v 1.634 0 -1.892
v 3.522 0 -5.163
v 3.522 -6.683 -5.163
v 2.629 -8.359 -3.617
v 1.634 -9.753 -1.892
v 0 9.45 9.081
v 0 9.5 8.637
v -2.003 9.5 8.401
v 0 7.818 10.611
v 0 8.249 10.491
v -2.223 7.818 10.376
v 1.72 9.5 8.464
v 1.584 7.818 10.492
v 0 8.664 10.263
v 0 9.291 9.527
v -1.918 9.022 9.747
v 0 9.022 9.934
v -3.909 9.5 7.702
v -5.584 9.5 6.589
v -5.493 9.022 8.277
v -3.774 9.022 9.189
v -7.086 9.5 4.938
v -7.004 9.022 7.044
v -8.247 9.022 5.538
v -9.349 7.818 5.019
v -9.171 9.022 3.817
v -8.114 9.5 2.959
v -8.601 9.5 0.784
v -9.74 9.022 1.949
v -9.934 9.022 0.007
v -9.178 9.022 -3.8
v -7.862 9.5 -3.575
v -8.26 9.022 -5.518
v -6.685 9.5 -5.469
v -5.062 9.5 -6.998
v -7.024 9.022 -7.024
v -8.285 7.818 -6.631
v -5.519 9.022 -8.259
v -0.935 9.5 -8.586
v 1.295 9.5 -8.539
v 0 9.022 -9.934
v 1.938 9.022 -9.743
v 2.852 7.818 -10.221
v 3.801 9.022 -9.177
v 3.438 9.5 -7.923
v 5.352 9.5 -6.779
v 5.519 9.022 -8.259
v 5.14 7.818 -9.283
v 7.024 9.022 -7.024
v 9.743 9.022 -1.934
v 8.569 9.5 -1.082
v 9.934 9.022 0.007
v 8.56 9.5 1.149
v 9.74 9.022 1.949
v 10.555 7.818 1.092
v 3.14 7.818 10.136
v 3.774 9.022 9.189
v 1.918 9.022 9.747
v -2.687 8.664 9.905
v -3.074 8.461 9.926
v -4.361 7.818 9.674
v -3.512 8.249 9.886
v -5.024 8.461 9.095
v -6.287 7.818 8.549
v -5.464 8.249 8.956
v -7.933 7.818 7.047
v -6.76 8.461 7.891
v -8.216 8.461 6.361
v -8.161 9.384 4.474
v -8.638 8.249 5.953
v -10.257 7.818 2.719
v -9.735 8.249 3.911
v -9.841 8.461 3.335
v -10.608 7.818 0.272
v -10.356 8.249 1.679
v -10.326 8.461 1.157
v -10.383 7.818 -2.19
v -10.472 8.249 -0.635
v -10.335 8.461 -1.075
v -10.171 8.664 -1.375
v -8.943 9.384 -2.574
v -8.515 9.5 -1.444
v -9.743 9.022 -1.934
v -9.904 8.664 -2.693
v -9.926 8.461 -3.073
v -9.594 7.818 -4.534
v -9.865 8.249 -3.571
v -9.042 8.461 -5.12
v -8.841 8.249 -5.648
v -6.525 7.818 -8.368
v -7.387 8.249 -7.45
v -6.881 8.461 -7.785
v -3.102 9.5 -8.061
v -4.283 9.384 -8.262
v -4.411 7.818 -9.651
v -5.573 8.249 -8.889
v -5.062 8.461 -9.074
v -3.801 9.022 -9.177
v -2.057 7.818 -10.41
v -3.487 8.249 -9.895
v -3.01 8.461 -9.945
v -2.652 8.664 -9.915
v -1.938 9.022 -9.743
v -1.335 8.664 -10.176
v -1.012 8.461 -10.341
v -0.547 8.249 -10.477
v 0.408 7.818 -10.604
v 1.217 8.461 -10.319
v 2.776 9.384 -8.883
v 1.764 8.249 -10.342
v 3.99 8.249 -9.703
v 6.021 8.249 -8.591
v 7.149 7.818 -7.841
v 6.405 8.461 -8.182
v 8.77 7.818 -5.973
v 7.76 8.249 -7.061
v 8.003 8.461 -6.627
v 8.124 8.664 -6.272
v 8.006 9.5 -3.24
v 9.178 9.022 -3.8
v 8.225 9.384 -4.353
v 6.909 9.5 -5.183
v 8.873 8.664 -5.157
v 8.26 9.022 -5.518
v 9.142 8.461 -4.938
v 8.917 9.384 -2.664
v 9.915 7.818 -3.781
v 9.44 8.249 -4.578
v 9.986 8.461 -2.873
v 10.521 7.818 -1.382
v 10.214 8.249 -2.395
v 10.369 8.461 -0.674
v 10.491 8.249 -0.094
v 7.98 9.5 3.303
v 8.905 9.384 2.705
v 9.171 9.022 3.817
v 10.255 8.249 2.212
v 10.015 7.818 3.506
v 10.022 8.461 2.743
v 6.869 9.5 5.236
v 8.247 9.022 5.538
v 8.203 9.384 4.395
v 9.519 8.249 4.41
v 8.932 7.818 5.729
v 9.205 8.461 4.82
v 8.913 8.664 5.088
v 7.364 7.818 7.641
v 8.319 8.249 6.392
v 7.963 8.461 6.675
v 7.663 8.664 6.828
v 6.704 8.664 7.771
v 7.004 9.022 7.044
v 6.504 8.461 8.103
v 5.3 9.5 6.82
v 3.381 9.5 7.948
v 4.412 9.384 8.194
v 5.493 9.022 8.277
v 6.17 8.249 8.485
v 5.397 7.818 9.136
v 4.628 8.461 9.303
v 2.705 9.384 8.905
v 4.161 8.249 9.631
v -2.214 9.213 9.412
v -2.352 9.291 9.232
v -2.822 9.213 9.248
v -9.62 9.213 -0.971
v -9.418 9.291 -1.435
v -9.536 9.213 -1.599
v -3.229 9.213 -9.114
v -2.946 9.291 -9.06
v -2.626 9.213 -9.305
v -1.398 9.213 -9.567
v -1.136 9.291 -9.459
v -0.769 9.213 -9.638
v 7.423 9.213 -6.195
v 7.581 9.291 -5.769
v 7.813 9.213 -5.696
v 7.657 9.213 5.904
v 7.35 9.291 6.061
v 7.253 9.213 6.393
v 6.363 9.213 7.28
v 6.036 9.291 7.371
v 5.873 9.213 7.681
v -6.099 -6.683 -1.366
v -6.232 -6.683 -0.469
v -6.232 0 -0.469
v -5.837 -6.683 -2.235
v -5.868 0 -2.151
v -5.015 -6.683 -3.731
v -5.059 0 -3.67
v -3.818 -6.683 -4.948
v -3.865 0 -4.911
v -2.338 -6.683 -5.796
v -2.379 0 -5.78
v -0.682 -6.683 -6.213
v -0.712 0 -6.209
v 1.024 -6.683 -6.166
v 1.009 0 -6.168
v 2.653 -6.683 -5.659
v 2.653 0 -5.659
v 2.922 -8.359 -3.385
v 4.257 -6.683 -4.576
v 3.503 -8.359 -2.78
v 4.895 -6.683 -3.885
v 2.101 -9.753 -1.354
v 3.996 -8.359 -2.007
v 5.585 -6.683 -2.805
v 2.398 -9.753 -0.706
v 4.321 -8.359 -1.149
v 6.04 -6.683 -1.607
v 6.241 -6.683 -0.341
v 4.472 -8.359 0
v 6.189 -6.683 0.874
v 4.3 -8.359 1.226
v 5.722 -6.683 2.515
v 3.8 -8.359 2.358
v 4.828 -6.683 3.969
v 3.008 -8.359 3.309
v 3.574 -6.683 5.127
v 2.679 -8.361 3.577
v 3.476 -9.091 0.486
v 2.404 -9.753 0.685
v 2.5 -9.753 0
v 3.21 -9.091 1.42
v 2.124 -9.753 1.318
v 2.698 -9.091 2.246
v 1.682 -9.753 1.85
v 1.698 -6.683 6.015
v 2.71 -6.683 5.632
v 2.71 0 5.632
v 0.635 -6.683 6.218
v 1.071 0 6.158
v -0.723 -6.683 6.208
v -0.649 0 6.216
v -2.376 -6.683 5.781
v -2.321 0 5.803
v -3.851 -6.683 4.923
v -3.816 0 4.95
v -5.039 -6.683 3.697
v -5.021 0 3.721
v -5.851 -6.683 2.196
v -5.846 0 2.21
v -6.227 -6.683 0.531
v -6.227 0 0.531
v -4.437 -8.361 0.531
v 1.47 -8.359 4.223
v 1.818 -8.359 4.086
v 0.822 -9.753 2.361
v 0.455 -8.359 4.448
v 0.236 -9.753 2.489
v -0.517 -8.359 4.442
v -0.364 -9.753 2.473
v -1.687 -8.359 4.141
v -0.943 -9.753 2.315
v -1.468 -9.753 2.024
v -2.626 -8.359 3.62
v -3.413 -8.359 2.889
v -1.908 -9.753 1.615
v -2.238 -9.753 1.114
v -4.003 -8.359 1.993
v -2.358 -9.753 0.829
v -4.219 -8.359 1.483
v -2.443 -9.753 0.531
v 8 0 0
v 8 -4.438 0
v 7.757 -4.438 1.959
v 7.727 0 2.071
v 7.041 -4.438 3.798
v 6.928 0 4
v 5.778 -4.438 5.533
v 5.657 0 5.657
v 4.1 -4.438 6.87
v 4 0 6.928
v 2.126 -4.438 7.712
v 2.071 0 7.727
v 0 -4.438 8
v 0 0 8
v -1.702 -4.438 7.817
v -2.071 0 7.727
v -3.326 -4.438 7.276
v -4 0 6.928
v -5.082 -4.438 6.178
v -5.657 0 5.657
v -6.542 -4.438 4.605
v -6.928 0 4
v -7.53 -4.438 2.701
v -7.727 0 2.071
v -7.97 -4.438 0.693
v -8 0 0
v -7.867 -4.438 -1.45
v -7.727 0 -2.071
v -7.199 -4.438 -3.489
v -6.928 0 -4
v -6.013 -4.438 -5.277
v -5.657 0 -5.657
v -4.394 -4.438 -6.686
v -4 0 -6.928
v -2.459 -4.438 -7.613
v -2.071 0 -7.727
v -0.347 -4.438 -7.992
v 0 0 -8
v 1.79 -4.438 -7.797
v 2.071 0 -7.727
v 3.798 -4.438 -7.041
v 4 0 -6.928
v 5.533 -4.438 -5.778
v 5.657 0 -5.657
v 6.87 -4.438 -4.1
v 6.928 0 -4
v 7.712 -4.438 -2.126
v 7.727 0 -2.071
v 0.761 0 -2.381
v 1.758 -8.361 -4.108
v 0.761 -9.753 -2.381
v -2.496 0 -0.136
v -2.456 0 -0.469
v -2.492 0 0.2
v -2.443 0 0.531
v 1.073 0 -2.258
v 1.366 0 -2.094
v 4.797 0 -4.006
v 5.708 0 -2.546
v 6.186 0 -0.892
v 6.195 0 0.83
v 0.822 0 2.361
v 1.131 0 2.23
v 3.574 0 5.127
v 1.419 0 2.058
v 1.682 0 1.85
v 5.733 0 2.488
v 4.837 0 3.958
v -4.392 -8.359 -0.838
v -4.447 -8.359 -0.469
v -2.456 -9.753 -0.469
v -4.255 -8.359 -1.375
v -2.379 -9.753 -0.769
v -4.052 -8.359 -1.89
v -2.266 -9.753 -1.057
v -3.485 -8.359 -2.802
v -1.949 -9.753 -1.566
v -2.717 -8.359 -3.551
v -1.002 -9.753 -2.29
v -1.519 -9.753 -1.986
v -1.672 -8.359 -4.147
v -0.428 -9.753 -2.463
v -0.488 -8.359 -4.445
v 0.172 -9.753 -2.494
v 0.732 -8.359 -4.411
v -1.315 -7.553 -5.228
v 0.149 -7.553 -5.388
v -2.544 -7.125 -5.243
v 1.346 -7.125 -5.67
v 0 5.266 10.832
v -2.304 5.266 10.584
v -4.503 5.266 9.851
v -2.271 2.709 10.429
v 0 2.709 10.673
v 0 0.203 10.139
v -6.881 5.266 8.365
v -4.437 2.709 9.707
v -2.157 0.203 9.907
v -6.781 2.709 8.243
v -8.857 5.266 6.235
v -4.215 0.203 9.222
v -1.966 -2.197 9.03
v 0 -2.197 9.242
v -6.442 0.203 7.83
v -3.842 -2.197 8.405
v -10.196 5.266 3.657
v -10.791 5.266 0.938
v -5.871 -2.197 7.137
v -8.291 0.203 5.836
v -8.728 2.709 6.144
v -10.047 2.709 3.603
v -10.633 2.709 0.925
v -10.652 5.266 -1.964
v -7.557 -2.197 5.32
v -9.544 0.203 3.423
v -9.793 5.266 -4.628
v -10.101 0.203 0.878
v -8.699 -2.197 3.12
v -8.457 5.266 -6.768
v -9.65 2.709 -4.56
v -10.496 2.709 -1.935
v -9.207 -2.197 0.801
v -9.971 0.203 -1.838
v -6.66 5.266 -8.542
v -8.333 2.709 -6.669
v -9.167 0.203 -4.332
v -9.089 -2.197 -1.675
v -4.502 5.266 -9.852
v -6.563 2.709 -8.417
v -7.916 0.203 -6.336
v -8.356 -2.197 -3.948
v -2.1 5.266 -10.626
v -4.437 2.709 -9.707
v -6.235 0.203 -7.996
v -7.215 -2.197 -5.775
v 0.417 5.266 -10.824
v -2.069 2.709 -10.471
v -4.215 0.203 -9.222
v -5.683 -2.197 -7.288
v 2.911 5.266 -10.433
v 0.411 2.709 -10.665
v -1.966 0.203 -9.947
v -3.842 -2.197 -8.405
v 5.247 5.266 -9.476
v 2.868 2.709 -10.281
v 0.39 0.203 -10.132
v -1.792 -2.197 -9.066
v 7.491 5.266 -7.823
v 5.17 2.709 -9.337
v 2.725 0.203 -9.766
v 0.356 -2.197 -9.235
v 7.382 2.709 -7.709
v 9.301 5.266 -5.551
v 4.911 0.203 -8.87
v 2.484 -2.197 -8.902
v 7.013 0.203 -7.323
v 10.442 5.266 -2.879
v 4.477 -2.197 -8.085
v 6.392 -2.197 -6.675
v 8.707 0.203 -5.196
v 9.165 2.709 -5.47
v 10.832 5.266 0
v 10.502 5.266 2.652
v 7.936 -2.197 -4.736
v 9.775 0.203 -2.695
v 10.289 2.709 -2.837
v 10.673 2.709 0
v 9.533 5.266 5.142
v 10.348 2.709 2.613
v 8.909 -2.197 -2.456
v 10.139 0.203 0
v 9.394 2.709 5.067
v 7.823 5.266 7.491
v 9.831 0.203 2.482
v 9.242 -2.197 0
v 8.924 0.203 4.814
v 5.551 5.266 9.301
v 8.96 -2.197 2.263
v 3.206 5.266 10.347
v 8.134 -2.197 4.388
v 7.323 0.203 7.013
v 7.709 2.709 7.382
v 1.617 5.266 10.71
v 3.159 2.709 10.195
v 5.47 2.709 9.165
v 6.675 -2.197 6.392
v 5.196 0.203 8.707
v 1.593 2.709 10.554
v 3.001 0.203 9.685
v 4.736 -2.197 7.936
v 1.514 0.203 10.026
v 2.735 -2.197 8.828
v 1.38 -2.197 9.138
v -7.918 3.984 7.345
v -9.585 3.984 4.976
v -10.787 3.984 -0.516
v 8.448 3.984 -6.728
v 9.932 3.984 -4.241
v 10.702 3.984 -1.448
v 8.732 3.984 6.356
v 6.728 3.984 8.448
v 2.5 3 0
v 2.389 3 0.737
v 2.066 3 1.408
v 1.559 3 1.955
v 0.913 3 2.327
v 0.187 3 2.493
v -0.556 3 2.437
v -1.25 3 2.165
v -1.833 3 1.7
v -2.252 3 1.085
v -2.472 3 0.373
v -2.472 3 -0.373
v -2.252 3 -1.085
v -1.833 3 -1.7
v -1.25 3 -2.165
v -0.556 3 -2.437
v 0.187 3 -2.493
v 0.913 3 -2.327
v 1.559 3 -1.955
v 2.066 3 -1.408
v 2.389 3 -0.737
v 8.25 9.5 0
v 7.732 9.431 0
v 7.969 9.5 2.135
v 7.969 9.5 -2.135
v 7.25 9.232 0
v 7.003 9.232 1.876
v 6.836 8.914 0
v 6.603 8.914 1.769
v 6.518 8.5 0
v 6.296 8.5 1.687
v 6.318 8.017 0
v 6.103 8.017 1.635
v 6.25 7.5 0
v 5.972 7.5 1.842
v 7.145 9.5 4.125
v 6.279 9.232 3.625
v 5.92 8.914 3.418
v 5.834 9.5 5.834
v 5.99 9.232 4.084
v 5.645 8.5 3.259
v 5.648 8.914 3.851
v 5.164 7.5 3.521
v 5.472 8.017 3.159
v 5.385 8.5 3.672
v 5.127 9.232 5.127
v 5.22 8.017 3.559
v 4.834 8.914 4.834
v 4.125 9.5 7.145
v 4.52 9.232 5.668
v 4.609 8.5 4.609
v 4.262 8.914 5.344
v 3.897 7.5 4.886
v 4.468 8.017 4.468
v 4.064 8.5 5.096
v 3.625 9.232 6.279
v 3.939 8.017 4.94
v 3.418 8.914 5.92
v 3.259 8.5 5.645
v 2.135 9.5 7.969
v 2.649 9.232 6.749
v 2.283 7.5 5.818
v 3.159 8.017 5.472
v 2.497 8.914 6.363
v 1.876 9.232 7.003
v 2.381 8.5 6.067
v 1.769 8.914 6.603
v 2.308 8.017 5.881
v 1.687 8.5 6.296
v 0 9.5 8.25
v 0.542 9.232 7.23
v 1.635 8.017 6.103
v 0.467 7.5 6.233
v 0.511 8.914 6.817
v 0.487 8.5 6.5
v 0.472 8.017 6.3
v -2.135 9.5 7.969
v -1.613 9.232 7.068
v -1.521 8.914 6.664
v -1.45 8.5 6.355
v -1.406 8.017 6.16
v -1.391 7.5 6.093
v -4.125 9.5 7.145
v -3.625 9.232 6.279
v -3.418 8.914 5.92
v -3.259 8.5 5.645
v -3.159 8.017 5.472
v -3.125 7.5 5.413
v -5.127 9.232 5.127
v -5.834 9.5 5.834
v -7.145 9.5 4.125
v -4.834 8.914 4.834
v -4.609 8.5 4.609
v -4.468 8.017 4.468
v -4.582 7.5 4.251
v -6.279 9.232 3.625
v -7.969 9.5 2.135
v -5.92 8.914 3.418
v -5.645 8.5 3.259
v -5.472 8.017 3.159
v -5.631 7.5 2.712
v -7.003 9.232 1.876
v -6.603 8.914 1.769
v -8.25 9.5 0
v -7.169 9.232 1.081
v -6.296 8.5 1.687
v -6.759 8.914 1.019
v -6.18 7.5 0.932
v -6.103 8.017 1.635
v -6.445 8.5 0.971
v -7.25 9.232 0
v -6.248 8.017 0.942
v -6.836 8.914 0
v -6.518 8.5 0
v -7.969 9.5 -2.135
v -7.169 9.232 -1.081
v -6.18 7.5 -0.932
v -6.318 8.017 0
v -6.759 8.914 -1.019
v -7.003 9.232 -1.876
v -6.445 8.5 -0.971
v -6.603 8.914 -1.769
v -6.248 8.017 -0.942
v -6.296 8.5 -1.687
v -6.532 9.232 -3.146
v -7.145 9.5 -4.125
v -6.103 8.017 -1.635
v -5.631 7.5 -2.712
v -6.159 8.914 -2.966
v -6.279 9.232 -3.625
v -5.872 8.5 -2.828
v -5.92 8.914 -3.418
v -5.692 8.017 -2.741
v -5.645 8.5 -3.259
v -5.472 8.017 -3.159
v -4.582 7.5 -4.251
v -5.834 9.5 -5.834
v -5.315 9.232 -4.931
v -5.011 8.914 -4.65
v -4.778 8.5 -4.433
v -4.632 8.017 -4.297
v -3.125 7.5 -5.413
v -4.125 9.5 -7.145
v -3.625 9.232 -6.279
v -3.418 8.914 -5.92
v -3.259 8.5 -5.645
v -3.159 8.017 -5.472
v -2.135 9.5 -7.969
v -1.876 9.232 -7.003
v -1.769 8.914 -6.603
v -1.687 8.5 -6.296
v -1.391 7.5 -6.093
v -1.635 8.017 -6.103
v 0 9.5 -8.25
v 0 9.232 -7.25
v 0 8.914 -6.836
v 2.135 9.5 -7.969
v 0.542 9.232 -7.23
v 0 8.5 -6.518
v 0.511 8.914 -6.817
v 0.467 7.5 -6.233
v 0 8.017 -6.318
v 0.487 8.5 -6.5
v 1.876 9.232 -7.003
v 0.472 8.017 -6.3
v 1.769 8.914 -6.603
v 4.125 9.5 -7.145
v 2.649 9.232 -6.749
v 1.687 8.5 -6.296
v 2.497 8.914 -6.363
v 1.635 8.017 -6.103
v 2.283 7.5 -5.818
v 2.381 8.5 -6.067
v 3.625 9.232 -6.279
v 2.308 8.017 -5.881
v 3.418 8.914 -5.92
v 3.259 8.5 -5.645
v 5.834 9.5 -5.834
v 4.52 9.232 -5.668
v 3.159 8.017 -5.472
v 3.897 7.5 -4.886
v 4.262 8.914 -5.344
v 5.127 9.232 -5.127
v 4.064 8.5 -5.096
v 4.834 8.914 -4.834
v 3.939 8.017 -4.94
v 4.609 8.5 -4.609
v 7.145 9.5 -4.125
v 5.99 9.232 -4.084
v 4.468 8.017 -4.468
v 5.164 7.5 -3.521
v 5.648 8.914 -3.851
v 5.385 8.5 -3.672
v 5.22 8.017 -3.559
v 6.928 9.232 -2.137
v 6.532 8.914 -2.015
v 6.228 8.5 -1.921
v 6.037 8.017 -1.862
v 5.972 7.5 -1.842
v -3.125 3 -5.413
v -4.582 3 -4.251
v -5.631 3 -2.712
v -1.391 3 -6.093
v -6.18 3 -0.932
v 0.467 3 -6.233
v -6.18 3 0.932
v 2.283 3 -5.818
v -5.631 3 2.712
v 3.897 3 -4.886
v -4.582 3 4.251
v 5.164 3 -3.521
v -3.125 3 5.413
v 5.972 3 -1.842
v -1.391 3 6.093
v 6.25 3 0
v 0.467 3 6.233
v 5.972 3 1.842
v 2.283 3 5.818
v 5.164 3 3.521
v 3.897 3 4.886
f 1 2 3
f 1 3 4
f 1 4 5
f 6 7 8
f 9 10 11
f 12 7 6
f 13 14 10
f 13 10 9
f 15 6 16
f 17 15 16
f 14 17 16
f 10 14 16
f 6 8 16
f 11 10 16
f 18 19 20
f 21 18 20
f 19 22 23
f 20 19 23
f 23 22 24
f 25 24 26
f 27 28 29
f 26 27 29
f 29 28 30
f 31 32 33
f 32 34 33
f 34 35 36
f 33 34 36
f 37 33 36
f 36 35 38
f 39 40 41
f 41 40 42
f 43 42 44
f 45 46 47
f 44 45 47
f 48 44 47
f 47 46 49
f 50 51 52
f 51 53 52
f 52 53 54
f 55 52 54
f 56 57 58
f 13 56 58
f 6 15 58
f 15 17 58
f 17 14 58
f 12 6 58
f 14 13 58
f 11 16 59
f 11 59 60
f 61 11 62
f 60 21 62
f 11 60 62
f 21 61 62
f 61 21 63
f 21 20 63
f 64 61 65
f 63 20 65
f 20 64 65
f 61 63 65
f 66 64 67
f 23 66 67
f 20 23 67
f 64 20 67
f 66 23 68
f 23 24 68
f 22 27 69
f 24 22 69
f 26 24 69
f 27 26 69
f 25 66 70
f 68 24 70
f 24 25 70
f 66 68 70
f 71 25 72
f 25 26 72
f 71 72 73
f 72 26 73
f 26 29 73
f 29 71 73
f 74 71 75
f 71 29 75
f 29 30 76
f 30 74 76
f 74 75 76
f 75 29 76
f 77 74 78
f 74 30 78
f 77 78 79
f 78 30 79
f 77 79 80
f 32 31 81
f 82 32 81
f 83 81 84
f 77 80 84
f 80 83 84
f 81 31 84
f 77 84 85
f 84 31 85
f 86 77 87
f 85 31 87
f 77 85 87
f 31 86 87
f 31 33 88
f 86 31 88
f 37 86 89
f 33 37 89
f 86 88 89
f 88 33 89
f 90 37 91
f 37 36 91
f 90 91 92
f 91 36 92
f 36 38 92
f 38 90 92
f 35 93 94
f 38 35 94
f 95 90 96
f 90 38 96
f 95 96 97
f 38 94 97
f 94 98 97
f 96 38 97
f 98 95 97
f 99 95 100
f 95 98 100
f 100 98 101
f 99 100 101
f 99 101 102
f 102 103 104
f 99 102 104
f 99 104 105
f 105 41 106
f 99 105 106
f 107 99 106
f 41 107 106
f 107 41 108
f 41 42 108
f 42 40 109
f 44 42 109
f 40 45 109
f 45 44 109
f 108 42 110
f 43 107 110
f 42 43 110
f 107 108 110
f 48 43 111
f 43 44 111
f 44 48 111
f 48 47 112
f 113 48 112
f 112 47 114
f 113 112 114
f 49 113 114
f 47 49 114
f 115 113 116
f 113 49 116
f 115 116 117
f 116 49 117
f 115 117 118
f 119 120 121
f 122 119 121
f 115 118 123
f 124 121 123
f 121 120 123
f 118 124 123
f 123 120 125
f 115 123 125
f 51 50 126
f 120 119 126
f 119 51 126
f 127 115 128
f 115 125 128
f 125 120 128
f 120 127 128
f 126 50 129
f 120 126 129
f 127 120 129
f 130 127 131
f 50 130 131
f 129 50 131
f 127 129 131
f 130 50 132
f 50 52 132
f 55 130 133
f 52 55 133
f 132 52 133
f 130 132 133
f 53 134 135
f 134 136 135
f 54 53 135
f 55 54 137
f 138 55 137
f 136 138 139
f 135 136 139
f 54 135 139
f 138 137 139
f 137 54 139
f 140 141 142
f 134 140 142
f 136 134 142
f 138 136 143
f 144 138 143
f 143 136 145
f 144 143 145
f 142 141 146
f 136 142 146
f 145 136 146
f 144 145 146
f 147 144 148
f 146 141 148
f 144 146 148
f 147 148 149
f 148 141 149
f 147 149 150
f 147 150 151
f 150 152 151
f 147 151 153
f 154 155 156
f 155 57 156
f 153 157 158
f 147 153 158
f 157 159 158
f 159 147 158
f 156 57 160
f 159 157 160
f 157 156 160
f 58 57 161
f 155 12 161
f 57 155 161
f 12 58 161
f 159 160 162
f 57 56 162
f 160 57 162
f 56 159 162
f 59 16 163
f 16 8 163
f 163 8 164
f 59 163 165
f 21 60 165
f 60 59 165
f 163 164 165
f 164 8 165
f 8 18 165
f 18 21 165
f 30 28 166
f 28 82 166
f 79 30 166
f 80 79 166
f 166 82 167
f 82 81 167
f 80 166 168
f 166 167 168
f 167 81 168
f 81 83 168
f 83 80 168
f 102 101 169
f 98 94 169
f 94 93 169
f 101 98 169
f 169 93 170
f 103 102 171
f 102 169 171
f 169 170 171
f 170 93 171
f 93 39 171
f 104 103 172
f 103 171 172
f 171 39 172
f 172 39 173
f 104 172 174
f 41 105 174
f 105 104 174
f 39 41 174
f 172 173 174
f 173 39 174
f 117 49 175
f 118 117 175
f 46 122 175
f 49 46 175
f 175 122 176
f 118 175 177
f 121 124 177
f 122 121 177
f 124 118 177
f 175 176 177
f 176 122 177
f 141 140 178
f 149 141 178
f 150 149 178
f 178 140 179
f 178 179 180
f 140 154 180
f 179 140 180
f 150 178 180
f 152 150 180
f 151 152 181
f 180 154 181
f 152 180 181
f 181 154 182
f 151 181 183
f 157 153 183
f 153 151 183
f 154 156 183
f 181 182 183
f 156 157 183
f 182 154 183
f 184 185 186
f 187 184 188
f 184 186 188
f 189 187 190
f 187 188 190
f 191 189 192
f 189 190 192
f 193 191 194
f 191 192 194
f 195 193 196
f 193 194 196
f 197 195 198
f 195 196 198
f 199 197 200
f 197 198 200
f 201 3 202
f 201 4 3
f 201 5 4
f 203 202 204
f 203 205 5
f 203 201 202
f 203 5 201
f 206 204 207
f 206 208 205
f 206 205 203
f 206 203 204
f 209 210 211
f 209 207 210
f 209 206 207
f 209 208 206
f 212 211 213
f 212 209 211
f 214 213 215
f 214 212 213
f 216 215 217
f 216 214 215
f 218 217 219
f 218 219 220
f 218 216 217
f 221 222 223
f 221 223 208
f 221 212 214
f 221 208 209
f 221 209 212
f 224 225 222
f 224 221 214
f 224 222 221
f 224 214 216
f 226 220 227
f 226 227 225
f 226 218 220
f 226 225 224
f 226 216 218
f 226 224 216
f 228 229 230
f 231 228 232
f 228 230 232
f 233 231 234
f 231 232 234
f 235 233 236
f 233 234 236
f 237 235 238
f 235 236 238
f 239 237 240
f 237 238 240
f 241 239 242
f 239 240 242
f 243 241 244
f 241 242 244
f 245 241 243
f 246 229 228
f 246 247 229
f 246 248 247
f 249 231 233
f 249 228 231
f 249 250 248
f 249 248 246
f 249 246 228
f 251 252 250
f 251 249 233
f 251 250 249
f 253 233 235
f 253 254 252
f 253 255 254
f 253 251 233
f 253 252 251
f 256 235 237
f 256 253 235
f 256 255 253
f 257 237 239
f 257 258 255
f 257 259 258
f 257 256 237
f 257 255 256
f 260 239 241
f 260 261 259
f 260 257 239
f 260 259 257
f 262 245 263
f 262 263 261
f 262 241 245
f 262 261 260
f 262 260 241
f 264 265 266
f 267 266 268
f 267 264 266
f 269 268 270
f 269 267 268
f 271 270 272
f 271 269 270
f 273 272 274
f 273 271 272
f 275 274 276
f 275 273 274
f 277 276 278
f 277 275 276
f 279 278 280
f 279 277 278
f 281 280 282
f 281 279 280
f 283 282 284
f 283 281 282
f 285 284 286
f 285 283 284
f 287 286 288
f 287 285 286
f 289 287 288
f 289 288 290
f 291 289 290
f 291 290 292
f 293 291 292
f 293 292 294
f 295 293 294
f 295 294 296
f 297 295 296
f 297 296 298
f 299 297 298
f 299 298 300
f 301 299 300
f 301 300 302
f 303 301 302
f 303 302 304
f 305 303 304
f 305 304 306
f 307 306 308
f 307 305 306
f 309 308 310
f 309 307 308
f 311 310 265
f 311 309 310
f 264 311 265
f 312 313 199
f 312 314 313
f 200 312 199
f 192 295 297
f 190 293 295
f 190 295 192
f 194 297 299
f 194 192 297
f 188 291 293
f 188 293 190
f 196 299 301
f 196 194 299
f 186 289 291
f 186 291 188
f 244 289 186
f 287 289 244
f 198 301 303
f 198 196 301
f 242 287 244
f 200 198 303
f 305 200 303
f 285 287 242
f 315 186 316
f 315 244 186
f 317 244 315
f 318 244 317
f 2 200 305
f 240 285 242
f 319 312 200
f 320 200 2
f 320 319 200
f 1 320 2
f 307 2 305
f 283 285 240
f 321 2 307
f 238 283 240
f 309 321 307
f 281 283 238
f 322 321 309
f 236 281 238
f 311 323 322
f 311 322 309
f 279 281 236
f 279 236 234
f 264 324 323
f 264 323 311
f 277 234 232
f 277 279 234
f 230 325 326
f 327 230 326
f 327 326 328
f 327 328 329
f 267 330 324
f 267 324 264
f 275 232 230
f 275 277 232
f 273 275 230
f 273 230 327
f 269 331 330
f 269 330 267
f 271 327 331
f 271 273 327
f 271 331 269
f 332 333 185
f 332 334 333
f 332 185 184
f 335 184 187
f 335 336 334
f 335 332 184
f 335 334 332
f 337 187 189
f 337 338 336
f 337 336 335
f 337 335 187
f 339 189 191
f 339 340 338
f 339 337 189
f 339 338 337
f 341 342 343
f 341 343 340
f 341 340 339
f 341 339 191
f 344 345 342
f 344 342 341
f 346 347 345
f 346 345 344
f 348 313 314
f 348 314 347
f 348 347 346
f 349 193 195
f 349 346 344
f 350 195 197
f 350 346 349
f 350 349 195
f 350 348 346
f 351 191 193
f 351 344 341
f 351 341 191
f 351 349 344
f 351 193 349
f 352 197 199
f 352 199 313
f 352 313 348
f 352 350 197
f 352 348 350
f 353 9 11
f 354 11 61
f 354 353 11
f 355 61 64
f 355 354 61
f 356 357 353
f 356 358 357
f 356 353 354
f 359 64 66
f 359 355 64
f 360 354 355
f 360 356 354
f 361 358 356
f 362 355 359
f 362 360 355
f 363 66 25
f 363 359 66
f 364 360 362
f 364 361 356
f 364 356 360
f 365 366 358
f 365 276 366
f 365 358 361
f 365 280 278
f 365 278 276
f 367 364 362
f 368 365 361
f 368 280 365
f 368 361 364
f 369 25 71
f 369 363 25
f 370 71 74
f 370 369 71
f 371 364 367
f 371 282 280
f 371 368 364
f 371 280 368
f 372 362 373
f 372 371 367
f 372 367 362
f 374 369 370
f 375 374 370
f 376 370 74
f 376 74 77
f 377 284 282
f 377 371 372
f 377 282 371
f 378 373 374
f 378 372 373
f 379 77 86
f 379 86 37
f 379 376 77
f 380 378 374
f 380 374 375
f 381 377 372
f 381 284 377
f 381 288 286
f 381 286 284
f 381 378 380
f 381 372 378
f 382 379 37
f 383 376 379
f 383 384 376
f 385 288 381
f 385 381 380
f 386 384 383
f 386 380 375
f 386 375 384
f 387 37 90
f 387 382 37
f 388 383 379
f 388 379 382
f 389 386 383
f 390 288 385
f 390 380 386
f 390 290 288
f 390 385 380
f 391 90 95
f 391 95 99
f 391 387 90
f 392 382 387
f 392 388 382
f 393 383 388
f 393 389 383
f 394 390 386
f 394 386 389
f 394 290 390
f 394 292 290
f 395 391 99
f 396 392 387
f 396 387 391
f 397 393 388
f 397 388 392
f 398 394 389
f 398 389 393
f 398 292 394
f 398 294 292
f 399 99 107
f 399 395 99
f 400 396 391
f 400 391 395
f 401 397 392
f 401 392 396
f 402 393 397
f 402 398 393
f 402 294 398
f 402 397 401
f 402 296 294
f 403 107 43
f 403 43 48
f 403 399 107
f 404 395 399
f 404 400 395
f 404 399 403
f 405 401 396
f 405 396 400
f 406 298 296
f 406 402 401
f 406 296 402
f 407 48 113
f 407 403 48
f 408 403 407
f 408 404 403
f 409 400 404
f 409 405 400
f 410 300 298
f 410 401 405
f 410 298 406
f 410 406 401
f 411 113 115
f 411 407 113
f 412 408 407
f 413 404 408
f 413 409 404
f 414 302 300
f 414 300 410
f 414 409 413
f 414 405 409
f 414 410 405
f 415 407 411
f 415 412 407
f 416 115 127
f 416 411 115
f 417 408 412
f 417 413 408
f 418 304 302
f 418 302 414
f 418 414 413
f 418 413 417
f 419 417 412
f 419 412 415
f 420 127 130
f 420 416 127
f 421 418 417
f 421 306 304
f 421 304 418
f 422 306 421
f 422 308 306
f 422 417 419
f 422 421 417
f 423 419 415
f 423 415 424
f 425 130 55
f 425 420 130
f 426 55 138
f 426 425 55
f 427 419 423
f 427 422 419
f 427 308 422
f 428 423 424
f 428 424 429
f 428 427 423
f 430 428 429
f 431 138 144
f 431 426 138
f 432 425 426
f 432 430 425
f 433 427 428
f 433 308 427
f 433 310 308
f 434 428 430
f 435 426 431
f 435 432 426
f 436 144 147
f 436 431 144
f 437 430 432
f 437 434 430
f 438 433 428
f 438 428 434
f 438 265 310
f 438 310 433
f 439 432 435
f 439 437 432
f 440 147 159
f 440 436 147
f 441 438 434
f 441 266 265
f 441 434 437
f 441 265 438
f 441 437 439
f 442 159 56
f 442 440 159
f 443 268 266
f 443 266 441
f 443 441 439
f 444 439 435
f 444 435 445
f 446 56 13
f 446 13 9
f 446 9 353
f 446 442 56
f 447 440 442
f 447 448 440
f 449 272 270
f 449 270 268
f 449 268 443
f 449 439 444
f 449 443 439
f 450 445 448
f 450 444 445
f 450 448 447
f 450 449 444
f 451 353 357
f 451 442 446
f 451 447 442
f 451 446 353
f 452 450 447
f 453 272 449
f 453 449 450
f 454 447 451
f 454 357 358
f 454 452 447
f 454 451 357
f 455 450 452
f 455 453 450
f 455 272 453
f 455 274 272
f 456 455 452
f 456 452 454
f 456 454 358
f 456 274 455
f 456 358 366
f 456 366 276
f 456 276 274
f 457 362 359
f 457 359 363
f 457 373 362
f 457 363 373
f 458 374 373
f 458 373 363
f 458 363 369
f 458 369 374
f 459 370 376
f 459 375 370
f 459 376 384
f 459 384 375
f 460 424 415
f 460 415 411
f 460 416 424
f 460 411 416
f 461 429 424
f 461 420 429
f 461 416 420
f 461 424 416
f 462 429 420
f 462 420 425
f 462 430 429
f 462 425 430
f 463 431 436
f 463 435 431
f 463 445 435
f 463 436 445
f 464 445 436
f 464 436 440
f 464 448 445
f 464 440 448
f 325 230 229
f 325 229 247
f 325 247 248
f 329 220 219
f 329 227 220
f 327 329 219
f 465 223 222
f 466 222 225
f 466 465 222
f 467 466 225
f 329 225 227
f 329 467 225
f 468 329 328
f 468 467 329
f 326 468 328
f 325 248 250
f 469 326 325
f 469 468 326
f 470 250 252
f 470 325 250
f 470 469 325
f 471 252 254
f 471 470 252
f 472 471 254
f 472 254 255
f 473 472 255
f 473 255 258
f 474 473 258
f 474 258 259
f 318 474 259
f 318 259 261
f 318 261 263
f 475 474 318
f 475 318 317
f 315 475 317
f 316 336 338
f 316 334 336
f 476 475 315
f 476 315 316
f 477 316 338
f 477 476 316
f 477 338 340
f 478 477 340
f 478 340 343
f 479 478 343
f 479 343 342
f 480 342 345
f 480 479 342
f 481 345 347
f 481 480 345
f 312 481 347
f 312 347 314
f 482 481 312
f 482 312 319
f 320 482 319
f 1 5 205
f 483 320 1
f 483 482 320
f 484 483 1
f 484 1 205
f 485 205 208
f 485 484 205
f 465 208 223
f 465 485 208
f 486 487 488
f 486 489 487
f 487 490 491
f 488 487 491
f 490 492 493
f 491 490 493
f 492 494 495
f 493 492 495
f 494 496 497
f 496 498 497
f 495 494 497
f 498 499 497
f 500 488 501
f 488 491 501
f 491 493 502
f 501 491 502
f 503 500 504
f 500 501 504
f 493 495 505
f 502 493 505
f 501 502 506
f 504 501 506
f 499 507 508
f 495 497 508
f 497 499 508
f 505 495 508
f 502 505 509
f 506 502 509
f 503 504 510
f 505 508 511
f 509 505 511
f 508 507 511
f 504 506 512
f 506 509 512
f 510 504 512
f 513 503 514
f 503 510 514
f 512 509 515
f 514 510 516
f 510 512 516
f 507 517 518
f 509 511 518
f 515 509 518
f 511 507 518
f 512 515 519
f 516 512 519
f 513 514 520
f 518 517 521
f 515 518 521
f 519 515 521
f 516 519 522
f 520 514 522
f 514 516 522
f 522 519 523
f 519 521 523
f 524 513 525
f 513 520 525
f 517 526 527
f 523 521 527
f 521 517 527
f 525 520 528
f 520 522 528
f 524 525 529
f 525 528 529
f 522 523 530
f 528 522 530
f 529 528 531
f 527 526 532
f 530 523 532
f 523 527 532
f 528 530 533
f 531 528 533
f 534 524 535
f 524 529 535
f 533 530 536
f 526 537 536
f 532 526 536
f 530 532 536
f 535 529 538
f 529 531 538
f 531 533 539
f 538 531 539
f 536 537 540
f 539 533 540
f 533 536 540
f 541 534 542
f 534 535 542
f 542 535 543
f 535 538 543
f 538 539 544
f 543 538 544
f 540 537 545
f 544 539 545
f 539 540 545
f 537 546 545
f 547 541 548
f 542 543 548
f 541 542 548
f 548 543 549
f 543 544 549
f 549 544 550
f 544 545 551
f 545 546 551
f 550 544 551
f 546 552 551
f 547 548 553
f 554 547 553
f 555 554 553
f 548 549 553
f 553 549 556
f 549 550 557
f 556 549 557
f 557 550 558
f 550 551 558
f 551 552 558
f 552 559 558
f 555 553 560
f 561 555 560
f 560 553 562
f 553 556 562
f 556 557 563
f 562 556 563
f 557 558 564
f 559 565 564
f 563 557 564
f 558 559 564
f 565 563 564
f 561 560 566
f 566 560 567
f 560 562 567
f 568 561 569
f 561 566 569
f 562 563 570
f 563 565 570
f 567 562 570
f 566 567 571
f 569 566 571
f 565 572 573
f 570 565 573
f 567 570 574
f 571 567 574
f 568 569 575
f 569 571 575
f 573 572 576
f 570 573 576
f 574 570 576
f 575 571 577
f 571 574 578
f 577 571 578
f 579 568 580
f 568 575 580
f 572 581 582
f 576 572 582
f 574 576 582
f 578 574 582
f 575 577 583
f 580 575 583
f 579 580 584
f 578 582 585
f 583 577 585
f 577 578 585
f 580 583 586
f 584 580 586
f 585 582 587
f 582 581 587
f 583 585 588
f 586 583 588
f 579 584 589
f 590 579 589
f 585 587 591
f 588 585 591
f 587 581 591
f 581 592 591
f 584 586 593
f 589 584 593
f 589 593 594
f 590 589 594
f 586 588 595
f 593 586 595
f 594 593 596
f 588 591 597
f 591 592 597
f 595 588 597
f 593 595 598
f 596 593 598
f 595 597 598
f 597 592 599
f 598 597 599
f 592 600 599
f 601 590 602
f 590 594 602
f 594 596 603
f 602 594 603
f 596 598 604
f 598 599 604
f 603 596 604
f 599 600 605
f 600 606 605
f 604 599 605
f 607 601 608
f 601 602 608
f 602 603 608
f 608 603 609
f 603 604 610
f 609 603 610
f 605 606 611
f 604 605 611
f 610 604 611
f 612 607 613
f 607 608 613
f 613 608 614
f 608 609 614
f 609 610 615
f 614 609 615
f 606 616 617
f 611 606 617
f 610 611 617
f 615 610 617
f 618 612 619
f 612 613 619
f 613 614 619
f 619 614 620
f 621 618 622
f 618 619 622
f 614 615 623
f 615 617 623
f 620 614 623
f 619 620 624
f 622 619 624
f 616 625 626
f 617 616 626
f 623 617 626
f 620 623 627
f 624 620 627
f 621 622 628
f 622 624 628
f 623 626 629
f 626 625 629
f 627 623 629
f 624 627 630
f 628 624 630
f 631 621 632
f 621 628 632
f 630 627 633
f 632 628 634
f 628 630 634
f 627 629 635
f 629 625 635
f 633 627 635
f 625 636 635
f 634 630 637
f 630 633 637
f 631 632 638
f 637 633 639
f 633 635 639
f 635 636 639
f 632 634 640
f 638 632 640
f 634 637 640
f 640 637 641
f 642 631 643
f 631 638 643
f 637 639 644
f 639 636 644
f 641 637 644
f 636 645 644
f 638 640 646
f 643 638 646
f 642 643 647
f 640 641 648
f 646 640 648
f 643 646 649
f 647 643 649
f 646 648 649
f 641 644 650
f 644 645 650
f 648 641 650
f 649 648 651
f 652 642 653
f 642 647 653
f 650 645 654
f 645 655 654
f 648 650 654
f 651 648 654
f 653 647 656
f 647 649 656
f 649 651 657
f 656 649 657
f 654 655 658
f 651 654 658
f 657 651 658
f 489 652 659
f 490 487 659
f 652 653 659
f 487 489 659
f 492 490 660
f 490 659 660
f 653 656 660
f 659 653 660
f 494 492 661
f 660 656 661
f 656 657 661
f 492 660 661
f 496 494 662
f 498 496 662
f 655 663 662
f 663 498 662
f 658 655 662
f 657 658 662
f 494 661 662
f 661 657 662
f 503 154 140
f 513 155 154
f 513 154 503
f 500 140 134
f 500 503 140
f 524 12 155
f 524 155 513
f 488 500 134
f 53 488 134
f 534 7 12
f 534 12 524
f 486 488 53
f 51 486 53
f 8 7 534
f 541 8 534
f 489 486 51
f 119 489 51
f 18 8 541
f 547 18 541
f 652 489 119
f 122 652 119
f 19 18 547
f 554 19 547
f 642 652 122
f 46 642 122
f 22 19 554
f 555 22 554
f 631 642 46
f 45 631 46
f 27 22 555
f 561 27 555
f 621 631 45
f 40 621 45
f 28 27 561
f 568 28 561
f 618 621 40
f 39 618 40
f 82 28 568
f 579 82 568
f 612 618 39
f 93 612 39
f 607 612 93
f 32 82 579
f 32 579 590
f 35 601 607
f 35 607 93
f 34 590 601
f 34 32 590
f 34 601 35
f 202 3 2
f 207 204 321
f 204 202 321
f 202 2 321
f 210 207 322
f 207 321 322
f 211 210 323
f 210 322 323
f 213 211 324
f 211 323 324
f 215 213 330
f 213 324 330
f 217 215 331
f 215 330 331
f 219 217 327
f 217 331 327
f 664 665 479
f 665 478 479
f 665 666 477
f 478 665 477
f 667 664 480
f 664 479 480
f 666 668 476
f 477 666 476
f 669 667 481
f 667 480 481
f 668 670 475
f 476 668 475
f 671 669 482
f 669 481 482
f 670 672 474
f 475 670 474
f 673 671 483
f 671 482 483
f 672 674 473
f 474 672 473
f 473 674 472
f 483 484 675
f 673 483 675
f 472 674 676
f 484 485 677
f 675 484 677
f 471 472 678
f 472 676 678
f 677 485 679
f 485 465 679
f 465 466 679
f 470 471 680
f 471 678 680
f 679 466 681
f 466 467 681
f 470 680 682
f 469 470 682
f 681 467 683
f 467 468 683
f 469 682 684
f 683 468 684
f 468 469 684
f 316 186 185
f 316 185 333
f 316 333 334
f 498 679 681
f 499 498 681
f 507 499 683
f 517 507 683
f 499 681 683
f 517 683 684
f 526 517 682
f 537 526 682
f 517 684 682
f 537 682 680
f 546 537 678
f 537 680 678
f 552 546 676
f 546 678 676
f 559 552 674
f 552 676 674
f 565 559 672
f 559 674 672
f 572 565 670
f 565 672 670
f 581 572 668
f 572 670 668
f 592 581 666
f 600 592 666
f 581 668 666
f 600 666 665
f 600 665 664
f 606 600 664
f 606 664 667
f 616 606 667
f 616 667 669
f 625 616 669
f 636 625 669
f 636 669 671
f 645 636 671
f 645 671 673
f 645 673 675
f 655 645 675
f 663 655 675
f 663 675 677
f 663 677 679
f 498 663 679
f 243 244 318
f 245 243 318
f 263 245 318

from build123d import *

# Parameters (mm, degrees)
F0_R          = 8
F0_R_2        = 6.25
F4_DEPTH      = 25
F0_R_3        = 2.5
F5_DEPTH      = 20
F5_DEPTH_BACK = 4
F6_START      = -3
F6_DEPTH      = 6.5005844247
F1_W          = 6
F1_H          = 1
F7_DEPTH      = 25
F8_R          = 2


with BuildPart() as f3:
    # F2 (on Right) → F3 (revolve)
    with BuildSketch(Plane.YZ):
        with BuildLine():
            Line((9.4995843247, 0), (9.4995843247, 10.2535216138))
            ThreePointArc((9.4995843247, 10.2535216138), (-2.6924670032, 9.0038209902), (-11.0074579716, 0))
            Line((-11.0074579716, 0), (9.4995843247, 0))
        make_face()
    revolve(axis=Axis((0, -0.7539368235, 0), (0, -1, 0)))

    # F0 (on Front) → F4 (cut)
    with BuildSketch(Plane.XZ):
        Circle(F0_R)
        Circle(F0_R_2, mode=Mode.SUBTRACT)
    extrude(amount=F4_DEPTH, mode=Mode.SUBTRACT)

    # F0 (on Front) → F5 (cut, two sides)
    with BuildSketch(Plane.XZ) as f5_sk:
        Circle(F0_R_3)
    extrude(amount=F5_DEPTH, mode=Mode.SUBTRACT)
    extrude(f5_sk.sketch, amount=-F5_DEPTH_BACK, mode=Mode.SUBTRACT)

    # F0 (on Front) → F6 (cut)
    with BuildSketch(Plane.XZ.offset(F6_START)):
        Circle(F0_R_2)
        Circle(F0_R_3, mode=Mode.SUBTRACT)
        Circle(F0_R_3)
    extrude(amount=-F6_DEPTH, mode=Mode.SUBTRACT)

    # F1 (on Front) → F7 (cut)
    with BuildSketch(Plane.XZ):
        with Locations((-4, 0.0314258505)):
            Rectangle(F1_W, F1_H)
        Polygon((0.0397717133, -1.131738329), (3.0397717133, -6.3278907517), (3.9057971171, -5.8278907517), (0.9057971171, -0.631738329), align=None)
        Polygon((0.9602282867, 0.6003124786), (3.9602282867, 5.7964649013), (3.0942028829, 6.2964649013), (0.0942028829, 1.1003124786), align=None)
    extrude(amount=F7_DEPTH, mode=Mode.SUBTRACT)

    # F8
    f8_edges = [f3.edges().sort_by_distance(p)[0] for p in [
        (0, 9.499584, -10.253522),
        (-6.25, 9.499584, 0),
    ]]
    fillet(f8_edges, radius=F8_R)


solid = f3.part
